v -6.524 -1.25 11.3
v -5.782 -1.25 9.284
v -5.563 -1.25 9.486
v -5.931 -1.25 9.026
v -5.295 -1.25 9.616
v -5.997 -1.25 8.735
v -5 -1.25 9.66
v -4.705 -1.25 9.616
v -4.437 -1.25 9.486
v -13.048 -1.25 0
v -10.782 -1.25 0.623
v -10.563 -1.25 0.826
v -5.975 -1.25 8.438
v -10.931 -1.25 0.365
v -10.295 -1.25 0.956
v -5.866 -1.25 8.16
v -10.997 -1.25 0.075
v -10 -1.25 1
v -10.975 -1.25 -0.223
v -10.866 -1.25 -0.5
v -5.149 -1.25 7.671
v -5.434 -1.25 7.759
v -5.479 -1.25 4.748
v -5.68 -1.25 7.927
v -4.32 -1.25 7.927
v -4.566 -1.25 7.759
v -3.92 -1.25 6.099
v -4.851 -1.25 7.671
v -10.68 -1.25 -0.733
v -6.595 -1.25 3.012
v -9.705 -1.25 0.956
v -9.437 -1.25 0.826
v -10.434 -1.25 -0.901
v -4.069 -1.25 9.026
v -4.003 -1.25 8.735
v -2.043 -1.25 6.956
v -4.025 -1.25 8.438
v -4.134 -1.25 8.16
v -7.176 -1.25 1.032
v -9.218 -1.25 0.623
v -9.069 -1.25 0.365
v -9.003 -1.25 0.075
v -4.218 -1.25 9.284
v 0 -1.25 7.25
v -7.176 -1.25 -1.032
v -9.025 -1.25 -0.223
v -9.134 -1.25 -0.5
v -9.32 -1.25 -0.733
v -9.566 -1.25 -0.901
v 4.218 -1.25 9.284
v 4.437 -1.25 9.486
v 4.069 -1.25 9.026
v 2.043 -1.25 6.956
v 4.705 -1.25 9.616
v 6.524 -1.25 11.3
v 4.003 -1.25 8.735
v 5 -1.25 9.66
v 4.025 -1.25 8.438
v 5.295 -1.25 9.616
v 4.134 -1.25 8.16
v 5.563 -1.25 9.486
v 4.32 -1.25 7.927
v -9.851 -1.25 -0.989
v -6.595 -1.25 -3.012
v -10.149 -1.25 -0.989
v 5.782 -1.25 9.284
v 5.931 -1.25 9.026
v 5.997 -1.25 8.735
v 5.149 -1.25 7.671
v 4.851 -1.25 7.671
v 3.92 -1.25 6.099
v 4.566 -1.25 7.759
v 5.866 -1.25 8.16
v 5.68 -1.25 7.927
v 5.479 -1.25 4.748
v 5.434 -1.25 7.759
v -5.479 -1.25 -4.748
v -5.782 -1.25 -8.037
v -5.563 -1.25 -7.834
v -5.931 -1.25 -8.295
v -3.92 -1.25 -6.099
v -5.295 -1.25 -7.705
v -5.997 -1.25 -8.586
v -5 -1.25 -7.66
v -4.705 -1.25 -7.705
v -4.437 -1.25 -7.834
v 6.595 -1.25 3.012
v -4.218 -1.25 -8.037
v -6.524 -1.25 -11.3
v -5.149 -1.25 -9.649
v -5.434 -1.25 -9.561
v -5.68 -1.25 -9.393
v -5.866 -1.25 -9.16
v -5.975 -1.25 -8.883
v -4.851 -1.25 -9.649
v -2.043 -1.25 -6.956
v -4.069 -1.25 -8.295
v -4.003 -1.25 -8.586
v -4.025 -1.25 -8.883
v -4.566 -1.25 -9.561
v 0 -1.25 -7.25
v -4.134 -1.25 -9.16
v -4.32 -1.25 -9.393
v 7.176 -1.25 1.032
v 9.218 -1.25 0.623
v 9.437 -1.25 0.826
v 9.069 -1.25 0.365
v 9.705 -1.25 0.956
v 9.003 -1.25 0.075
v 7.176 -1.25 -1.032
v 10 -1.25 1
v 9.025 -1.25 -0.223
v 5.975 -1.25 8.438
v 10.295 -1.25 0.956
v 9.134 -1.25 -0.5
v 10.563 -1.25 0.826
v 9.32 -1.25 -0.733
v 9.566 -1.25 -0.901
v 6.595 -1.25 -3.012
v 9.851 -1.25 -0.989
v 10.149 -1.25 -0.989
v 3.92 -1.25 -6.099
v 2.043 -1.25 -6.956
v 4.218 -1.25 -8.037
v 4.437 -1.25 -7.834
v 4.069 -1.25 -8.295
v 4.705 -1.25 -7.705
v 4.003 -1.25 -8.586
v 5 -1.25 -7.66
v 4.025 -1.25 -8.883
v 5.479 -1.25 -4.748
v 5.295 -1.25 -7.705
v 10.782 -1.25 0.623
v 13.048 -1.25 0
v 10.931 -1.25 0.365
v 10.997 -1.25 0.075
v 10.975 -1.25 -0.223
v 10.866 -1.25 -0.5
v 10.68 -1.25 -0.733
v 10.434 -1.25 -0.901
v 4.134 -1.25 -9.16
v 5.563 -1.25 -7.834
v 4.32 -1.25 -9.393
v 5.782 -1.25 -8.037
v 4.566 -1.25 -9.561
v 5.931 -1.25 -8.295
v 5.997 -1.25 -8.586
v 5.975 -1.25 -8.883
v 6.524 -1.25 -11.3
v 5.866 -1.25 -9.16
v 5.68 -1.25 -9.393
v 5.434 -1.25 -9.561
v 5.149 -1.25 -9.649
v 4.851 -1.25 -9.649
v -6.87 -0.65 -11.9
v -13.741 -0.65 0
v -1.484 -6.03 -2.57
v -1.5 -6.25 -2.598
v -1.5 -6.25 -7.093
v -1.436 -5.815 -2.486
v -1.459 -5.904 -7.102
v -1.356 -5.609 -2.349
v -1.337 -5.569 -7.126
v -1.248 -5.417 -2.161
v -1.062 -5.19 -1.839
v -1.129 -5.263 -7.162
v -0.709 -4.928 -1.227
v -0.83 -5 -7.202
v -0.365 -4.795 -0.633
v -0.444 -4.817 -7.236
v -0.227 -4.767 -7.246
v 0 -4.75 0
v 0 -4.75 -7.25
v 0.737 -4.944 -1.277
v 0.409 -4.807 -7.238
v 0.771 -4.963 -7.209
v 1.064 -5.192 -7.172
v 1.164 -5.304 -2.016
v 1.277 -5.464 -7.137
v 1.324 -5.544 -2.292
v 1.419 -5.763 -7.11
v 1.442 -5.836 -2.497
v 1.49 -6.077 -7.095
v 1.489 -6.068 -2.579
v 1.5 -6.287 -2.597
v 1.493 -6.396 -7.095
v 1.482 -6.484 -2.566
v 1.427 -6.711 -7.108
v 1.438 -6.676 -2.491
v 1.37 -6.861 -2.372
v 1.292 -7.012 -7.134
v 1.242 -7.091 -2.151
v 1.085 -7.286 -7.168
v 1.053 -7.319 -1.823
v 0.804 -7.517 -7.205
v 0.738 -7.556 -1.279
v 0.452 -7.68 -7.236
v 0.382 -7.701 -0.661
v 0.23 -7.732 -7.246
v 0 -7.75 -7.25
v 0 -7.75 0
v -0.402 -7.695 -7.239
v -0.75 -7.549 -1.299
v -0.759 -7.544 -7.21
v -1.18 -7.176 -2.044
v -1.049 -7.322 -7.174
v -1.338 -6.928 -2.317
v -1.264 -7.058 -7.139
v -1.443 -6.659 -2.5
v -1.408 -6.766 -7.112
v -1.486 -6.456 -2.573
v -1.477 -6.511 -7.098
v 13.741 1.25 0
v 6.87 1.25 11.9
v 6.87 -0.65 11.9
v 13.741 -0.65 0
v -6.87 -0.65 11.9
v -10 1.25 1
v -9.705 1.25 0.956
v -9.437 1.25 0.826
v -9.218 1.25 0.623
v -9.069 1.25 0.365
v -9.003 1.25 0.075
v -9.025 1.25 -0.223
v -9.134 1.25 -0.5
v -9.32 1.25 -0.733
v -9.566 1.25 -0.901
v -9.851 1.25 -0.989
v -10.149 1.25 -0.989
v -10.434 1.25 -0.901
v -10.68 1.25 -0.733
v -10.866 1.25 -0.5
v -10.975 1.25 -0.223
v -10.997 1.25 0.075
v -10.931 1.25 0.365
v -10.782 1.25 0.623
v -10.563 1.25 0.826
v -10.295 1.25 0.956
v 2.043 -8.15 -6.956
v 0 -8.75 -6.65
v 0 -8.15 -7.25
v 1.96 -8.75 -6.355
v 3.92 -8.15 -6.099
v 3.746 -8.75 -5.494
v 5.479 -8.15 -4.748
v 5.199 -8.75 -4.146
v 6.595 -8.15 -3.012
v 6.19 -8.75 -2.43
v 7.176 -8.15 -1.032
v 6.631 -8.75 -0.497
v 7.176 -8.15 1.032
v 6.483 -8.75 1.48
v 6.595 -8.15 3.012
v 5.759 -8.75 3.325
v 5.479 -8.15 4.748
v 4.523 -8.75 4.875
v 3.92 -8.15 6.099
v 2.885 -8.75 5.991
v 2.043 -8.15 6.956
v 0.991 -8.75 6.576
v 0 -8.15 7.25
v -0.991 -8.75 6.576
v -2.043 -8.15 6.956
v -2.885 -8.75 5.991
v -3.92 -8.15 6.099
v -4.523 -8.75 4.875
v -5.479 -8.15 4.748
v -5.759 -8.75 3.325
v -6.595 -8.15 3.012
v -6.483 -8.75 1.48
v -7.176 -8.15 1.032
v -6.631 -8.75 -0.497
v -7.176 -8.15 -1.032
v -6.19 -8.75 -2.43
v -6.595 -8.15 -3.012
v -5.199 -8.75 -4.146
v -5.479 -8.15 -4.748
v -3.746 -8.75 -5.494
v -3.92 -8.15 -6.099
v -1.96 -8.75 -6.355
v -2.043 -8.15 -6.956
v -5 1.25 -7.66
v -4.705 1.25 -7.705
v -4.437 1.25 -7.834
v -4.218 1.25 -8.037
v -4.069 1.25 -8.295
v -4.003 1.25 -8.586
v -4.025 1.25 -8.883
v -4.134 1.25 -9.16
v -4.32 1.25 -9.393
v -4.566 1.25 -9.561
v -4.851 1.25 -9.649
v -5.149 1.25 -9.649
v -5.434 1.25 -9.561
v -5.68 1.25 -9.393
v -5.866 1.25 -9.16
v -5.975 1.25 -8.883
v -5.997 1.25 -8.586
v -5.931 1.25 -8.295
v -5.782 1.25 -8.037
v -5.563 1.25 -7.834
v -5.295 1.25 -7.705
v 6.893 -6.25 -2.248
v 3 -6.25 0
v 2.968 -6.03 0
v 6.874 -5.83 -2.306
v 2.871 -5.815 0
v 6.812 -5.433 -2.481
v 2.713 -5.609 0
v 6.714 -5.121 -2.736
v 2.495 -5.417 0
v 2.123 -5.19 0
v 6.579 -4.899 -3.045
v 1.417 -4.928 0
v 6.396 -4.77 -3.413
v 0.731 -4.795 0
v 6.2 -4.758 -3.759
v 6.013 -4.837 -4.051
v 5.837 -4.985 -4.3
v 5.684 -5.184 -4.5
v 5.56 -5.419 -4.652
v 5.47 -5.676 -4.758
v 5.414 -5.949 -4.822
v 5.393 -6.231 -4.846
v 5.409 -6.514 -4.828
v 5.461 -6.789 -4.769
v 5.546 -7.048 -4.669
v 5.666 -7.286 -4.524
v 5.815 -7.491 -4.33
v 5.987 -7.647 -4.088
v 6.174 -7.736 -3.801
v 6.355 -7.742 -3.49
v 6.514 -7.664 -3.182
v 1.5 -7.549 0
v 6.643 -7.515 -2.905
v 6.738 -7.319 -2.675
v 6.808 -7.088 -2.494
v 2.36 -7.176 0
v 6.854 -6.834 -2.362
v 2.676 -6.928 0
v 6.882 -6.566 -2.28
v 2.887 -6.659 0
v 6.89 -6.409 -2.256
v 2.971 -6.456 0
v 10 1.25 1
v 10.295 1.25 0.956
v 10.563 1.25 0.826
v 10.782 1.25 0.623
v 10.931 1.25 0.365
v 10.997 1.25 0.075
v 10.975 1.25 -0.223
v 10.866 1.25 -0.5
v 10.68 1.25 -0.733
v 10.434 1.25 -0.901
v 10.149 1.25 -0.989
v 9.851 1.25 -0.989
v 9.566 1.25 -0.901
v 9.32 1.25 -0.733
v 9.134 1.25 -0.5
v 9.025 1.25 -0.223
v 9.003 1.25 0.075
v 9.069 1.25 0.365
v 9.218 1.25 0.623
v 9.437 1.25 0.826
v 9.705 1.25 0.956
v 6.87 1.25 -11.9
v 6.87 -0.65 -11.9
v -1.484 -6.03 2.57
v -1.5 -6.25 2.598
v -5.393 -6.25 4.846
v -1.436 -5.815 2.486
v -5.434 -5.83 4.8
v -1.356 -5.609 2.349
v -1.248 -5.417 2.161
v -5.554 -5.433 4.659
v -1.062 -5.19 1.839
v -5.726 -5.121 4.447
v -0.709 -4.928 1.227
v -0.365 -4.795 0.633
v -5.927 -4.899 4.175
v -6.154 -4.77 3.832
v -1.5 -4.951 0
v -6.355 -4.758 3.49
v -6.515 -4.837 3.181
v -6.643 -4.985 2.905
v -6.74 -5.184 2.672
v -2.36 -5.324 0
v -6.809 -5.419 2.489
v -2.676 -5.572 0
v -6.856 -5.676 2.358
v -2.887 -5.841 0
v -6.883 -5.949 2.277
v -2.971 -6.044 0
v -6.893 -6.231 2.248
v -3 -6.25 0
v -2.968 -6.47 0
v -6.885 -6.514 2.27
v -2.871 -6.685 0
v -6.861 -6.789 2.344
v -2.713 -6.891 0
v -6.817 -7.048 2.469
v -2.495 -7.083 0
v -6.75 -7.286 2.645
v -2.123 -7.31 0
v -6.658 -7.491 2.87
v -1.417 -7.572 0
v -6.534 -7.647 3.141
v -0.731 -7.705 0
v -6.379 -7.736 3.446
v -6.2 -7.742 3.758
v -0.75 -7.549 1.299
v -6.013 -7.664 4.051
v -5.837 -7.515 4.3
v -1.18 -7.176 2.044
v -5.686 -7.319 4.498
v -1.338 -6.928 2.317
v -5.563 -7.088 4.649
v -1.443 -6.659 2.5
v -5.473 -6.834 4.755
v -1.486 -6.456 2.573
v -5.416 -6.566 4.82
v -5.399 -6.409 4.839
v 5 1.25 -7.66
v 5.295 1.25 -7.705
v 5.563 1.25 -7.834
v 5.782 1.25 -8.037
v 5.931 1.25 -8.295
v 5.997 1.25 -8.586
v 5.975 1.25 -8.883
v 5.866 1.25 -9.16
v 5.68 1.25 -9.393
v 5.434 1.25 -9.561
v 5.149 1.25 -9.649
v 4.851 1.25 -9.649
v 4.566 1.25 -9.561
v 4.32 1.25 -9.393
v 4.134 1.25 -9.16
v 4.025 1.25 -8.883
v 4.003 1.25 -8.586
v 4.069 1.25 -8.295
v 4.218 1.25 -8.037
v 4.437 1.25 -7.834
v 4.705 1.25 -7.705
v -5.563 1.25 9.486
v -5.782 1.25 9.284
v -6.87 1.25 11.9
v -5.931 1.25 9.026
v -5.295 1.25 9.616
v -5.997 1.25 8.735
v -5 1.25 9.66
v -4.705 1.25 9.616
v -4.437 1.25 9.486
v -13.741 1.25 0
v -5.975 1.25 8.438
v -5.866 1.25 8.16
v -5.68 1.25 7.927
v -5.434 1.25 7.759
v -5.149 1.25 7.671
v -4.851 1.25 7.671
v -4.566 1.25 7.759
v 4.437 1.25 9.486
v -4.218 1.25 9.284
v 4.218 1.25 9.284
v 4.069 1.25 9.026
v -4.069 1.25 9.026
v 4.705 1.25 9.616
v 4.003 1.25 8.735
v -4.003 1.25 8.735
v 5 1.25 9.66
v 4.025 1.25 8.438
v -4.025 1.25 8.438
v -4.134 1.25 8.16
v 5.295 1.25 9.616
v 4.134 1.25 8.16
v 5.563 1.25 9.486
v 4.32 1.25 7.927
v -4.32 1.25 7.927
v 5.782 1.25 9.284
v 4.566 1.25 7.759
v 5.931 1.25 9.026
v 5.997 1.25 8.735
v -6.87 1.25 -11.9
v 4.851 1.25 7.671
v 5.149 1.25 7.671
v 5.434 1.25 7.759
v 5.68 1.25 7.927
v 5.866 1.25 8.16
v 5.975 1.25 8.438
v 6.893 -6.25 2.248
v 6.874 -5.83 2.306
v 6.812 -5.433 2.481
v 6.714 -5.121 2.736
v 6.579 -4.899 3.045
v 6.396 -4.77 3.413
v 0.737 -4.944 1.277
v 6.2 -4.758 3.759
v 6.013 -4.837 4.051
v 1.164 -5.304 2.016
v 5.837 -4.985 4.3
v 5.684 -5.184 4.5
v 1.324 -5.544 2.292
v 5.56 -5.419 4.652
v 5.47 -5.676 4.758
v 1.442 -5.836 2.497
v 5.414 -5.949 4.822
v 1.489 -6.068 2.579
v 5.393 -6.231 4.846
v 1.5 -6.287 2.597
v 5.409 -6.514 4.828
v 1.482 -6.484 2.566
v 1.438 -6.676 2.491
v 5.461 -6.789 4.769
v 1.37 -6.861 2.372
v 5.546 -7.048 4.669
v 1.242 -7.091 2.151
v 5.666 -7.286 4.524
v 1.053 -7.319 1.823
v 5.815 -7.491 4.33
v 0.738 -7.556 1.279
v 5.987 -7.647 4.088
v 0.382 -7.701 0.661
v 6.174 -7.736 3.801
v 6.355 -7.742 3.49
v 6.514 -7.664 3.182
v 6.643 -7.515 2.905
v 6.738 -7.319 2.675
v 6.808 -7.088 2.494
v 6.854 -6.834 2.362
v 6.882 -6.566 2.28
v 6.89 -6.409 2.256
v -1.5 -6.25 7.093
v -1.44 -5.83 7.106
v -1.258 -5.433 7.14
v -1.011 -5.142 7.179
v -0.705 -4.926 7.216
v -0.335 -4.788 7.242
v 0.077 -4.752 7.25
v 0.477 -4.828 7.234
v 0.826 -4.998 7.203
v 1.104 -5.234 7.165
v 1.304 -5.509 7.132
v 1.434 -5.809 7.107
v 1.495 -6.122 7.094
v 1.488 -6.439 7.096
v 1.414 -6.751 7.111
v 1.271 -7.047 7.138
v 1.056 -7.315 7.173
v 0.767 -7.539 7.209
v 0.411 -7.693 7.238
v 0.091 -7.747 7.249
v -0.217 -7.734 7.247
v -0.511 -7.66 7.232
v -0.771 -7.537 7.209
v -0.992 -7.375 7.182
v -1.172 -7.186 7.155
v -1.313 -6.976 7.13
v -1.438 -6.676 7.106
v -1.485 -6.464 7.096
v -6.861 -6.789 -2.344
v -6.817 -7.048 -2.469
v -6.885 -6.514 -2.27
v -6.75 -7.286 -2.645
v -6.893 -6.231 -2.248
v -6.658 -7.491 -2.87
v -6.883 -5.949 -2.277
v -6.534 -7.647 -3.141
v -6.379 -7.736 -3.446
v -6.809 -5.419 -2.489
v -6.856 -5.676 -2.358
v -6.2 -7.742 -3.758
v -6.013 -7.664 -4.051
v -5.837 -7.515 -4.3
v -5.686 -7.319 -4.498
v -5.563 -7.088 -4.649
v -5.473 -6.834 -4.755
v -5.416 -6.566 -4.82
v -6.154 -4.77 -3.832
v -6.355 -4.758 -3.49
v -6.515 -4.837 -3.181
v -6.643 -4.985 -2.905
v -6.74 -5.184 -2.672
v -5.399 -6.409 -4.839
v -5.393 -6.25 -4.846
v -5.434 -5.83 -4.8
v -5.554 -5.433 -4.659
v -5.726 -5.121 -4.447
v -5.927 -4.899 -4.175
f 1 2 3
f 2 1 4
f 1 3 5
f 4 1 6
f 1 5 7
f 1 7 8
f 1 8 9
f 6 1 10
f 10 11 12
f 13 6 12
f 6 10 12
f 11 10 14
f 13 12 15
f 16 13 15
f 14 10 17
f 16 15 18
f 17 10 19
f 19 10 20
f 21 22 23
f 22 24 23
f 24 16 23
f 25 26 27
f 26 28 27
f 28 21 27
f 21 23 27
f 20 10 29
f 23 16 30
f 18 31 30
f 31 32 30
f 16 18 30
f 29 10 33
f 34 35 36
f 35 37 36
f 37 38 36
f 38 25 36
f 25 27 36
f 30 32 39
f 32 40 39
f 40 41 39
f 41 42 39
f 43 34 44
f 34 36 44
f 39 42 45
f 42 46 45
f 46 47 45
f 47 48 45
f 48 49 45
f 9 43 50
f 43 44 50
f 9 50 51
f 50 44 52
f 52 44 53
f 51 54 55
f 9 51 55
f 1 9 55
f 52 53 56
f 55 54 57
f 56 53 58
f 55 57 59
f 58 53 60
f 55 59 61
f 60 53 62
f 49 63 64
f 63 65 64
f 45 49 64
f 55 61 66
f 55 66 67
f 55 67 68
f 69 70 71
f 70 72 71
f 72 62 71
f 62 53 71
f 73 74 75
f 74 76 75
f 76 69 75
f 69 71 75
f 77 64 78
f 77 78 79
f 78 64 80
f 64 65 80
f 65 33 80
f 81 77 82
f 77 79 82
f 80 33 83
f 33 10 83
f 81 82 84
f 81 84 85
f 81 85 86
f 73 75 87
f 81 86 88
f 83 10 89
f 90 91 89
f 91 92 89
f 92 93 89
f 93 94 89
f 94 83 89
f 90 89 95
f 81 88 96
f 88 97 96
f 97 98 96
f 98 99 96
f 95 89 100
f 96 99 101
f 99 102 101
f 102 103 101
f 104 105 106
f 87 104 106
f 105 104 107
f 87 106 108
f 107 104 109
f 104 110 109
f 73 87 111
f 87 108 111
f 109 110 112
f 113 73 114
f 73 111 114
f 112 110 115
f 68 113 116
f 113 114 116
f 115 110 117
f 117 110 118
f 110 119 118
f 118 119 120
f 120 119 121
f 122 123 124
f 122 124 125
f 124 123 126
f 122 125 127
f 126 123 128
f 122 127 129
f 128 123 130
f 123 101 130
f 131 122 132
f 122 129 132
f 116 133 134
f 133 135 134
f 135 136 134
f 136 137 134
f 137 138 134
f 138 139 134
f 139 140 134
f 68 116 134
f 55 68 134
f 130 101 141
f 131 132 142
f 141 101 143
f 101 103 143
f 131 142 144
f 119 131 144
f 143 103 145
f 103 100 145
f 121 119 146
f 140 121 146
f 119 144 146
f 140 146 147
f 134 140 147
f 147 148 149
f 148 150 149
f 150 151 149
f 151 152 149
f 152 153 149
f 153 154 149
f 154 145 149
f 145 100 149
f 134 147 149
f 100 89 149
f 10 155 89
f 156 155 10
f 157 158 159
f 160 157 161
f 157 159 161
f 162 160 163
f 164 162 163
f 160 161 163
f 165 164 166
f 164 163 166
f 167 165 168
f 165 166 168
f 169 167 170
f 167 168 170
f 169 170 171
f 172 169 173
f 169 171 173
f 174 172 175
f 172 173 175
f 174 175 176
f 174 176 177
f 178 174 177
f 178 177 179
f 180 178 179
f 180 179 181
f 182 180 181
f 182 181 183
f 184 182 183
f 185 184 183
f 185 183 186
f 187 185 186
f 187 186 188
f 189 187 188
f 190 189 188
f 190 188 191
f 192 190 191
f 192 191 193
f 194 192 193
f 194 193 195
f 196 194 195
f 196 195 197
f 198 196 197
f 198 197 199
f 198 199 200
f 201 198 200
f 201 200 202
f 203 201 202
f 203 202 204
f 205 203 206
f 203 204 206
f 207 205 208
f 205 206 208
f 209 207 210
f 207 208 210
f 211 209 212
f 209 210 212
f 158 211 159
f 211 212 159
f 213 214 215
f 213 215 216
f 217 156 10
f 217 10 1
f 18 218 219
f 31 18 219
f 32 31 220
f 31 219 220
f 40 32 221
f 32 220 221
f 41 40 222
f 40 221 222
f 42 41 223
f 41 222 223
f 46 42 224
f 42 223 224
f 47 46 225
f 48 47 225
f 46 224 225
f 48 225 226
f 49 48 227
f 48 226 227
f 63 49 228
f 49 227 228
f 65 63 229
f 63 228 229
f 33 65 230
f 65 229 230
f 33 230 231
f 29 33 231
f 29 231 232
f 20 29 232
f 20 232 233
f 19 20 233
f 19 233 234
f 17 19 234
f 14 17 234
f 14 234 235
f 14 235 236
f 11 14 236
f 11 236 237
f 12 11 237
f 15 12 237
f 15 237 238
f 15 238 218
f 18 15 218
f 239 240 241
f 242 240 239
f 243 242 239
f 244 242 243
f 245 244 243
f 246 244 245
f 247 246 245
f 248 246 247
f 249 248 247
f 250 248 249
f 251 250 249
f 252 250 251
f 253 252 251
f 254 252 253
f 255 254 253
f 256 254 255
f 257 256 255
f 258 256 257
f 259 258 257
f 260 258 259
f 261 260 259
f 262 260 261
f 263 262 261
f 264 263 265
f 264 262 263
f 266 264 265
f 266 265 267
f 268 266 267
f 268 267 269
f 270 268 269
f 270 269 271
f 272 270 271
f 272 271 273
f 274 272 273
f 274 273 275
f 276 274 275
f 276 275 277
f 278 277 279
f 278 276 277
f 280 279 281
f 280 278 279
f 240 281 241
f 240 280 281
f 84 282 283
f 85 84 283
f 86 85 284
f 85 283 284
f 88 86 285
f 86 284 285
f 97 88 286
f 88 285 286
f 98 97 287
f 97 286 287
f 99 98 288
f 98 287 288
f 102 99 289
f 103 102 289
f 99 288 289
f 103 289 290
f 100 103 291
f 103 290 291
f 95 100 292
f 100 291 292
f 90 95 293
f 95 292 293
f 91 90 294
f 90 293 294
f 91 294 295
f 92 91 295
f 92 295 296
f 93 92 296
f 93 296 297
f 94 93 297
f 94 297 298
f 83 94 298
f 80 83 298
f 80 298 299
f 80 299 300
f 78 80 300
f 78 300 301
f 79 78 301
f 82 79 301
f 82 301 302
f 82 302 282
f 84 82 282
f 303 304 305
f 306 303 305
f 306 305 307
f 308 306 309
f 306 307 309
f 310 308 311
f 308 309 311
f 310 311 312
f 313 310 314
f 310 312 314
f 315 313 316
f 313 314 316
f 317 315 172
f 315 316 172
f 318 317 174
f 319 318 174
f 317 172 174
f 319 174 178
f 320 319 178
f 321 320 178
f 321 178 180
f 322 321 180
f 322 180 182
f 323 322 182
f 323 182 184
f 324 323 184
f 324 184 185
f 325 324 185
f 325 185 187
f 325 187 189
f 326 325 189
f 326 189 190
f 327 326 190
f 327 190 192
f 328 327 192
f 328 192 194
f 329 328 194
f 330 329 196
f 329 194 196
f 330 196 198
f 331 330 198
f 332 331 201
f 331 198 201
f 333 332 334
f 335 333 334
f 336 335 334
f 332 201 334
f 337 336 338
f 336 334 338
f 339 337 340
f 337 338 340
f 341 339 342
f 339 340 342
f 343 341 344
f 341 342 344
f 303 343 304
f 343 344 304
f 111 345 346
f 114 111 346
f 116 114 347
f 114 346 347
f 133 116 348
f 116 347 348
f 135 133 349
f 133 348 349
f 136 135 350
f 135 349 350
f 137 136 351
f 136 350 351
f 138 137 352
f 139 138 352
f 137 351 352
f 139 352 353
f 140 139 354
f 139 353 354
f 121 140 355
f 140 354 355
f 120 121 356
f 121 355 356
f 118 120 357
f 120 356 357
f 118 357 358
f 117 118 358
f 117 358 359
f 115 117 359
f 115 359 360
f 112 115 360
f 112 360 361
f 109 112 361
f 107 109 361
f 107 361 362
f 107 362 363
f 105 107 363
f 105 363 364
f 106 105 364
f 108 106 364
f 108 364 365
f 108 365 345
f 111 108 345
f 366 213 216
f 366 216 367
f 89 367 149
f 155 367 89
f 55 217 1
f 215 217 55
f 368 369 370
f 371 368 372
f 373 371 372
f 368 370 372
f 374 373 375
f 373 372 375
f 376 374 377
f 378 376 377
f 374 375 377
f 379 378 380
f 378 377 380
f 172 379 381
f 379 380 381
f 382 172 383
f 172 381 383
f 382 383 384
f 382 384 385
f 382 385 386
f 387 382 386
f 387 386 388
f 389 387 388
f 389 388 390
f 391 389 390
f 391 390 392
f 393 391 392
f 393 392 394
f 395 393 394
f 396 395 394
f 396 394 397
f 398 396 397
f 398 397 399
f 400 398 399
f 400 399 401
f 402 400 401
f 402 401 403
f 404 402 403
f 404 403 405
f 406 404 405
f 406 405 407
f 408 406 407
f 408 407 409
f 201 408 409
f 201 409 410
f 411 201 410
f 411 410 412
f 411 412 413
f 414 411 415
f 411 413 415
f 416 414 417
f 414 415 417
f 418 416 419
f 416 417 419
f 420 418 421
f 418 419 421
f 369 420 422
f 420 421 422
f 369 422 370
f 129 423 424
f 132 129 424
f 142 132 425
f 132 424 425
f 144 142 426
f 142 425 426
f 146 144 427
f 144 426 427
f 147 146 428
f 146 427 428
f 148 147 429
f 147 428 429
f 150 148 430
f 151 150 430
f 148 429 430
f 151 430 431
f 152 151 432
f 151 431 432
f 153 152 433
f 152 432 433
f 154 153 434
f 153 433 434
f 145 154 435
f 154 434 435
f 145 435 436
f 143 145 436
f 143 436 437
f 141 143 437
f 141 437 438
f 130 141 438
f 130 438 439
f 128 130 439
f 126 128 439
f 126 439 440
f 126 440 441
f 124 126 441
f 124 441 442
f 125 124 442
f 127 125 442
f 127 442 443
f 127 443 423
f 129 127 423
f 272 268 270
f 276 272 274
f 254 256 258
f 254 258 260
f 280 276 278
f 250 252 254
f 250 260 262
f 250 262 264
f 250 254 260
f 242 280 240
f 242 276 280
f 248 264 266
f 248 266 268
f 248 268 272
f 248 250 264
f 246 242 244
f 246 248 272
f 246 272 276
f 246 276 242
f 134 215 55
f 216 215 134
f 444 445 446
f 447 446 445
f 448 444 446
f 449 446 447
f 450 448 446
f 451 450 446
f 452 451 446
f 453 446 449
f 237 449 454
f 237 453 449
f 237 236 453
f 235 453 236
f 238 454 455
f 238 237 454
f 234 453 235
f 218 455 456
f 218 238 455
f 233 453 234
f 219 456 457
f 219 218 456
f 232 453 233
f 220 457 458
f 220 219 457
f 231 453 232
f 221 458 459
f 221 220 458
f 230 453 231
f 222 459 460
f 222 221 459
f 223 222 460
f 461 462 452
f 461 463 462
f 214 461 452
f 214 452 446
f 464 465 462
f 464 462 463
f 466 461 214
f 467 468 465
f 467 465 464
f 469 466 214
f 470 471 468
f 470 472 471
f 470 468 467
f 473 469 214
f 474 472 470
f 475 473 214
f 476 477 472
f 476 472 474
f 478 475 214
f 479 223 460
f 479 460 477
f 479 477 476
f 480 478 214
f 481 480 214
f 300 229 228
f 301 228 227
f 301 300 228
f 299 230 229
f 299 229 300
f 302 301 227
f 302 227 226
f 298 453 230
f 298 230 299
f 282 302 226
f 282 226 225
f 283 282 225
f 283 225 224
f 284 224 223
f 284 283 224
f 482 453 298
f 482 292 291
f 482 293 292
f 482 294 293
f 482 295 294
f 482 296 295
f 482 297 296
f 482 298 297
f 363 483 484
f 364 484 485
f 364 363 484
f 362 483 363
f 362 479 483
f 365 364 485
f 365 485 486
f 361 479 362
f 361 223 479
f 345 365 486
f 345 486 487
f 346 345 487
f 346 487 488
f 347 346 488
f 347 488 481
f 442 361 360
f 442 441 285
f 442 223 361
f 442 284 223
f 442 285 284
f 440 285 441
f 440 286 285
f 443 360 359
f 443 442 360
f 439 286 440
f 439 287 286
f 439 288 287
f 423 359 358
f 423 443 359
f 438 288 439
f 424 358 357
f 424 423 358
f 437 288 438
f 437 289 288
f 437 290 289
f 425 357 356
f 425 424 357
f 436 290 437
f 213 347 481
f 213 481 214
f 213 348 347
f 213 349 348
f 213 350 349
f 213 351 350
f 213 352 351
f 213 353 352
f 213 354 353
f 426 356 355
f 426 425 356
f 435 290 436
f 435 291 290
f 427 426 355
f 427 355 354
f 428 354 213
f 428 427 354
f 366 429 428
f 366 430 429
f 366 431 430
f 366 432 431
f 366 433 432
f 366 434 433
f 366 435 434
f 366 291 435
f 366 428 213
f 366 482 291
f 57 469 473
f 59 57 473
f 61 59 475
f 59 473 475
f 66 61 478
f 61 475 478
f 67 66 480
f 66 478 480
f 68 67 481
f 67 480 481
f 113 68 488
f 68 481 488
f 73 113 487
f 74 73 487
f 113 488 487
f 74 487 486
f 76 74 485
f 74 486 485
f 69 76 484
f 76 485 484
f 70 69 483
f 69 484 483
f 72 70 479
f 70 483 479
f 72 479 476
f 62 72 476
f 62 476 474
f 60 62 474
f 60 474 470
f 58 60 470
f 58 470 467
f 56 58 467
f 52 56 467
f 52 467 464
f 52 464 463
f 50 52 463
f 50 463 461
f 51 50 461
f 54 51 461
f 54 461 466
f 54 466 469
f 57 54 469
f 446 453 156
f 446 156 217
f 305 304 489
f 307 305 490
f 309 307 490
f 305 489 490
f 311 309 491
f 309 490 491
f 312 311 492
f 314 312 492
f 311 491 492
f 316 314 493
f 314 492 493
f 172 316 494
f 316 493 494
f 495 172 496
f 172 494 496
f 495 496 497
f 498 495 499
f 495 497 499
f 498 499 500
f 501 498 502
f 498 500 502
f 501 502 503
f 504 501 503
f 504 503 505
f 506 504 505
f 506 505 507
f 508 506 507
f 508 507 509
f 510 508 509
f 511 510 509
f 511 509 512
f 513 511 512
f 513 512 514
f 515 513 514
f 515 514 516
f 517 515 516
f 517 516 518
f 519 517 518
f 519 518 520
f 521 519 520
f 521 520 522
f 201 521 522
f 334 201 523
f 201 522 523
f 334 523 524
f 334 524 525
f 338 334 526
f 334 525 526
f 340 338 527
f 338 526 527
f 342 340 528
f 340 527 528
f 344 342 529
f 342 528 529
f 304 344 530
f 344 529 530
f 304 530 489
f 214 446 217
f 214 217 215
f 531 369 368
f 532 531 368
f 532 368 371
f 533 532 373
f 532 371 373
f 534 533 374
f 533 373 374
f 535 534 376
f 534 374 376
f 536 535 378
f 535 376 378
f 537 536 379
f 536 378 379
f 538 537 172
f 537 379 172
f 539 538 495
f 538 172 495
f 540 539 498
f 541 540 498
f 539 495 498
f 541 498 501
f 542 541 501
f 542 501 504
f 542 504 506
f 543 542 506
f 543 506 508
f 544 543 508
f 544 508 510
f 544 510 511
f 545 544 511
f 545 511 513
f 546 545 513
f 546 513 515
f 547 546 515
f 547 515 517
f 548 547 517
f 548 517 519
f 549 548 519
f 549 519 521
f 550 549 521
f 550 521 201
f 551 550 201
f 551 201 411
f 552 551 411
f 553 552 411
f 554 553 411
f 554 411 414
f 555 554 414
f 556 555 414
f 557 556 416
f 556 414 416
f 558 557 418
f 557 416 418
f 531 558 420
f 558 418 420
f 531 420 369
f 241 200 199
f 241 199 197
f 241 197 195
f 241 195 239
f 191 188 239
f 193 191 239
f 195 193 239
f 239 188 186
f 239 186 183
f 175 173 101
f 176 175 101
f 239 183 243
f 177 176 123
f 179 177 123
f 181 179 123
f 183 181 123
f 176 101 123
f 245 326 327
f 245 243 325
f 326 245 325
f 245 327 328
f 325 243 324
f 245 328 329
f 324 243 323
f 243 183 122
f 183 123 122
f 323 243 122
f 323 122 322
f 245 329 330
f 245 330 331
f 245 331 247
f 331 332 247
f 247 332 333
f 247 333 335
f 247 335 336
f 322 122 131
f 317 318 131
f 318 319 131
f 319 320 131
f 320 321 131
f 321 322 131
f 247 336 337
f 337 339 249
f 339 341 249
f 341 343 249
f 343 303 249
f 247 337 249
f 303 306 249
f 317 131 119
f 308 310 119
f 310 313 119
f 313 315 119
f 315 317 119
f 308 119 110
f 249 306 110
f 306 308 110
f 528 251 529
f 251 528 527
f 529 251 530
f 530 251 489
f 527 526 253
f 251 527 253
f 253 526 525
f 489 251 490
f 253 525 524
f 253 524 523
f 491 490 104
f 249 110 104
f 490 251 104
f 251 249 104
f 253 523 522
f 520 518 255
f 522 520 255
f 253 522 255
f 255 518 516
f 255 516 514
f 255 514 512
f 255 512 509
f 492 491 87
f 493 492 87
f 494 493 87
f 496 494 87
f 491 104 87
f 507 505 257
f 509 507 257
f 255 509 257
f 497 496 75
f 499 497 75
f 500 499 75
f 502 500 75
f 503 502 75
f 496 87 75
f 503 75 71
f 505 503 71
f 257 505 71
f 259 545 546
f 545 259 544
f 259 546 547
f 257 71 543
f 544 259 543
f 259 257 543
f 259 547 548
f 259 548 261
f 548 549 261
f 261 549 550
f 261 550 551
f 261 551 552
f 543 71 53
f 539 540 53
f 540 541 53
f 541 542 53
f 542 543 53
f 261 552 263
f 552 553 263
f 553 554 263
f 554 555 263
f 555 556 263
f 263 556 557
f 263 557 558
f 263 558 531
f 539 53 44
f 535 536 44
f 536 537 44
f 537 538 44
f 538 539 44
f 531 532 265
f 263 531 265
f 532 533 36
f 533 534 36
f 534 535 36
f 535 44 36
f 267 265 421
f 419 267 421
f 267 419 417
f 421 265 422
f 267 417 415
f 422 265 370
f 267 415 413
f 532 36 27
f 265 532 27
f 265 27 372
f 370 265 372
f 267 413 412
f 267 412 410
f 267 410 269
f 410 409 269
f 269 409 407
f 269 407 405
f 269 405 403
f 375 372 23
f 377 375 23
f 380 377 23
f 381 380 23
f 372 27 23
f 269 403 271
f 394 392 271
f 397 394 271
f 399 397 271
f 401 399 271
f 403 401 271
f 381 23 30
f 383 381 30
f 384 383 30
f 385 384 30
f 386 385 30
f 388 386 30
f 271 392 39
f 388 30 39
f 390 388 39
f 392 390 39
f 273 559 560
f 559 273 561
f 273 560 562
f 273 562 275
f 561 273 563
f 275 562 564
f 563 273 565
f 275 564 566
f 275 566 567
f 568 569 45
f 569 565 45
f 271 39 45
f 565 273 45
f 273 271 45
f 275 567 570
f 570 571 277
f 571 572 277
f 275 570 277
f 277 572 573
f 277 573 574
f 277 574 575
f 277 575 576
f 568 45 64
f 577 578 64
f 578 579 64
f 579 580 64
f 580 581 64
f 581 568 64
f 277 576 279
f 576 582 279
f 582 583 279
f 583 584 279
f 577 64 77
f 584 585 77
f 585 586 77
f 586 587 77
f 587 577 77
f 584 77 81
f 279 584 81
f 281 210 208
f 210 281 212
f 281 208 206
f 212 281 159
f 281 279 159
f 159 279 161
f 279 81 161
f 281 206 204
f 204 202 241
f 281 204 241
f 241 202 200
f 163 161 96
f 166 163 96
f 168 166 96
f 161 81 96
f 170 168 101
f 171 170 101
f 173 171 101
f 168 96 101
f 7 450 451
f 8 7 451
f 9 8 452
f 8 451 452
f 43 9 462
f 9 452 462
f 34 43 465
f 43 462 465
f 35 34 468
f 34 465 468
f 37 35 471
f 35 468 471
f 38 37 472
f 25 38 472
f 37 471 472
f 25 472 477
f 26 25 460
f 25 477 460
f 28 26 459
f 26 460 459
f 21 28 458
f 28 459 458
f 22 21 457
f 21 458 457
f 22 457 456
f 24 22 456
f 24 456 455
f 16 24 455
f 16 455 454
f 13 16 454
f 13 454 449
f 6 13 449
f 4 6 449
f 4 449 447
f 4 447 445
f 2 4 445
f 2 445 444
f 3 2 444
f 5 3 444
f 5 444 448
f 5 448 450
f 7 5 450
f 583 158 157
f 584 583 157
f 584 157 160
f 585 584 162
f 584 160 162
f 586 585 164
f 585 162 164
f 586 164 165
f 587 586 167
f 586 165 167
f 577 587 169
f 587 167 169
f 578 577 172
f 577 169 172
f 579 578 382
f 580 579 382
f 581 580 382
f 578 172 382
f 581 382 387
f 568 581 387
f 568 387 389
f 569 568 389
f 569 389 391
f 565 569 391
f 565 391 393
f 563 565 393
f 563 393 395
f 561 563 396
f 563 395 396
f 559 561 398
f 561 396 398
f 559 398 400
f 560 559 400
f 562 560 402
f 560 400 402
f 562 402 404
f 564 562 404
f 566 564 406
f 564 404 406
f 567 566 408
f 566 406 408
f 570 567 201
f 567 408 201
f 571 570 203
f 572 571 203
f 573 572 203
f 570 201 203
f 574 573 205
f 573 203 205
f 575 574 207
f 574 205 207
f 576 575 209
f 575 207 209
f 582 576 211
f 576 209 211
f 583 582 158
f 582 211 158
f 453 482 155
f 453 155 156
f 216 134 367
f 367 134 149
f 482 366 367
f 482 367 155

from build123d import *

# Parameters (mm, degrees)
EXTRUDE_1_DEPTH          = 1.25
SKETCH_2_R               = 7.25
EXTRUDE_2_DEPTH          = 7.5
SKETCH_3_R               = 1.5
CUT_EXTRUDE_1_DEPTH      = 32.199772969
PATTERN_CIRCULAR_1_COUNT = 3
CHAMFER_1_SIZE           = 0.6
SKETCH_4_R               = 1
CUT_EXTRUDE_2_DEPTH      = 21.746646315


with BuildPart() as part:
    # 草图1 → 凸台-拉伸1 (new, symmetric)
    with BuildSketch(Plane(origin=(0, 0, 0), x_dir=(1, 0, 0), z_dir=(0, 1, 0))):
        Polygon((13.740936407, 0), (6.870468203, 11.9), (-6.870468203, 11.9), (-13.740936407, 0), (-6.870468203, -11.9), (6.870468203, -11.9), align=None)
    extrude(amount=EXTRUDE_1_DEPTH, both=True)

    # 草图2 → 凸台-拉伸2 (add)
    with BuildSketch(Plane.XZ.offset(1.25)):
        with Locations(Location((0, 0, 0), (0, 0, 270))):
            Circle(SKETCH_2_R)
    extrude(amount=EXTRUDE_2_DEPTH)

    # 草图3 → 切除-拉伸1 (cut, through all)
    with BuildSketch(Plane(origin=(-10.305702305, 0, 5.95), x_dir=(0.5000000000000071, 0, 0.8660254037844346), z_dir=(-0.8660254037844346, 0, 0.5000000000000071))):
        with Locations((0, -6.25)):
            Circle(SKETCH_3_R)
    cut_extrude_1 = extrude(amount=-CUT_EXTRUDE_1_DEPTH, mode=Mode.SUBTRACT)

    # 阵列(圆周)1: 切除-拉伸1 ×3 about axis
    pattern_circular_1_axis = Axis((0, -8.75, 0), (0, -1, 0))
    for i in range(1, PATTERN_CIRCULAR_1_COUNT):
        add(cut_extrude_1.rotate(pattern_circular_1_axis, i * 360 / PATTERN_CIRCULAR_1_COUNT), mode=Mode.SUBTRACT)

    # 倒角1
    chamfer_1_edges = [part.edges().sort_by_distance(p)[0] for p in [
        (0, -8.75, 7.25),
        (0, -1.25, 11.9),
        (-10.305702305, -1.25, 5.95),
        (-10.305702305, -1.25, -5.95),
        (0, -1.25, -11.9),
        (10.305702305, -1.25, -5.95),
        (10.305702305, -1.25, 5.95),
    ]]
    chamfer(chamfer_1_edges, length=CHAMFER_1_SIZE)

    # 草图4 → 切除-拉伸2 (cut, through all)
    with BuildSketch(Plane(origin=(0, 1.25, 0), x_dir=(1, 0, 0), z_dir=(0, 1, 0))):
        with Locations(Location((5, 8.660254038, 0), (0, 0, 270))):
            Circle(SKETCH_4_R)
        with Locations(Location((10, 0, 0), (0, 0, 270))):
            Circle(SKETCH_4_R)
        with Locations(Location((5, -8.660254038, 0), (0, 0, 270))):
            Circle(SKETCH_4_R)
        with Locations(Location((-5, -8.660254038, 0), (0, 0, 270))):
            Circle(SKETCH_4_R)
        with Locations(Location((-10, 0, 0), (0, 0, 270))):
            Circle(SKETCH_4_R)
        with Locations(Location((-5, 8.660254038, 0), (0, 0, 270))):
            Circle(SKETCH_4_R)
    extrude(amount=-CUT_EXTRUDE_2_DEPTH, mode=Mode.SUBTRACT)


solid = part.part
